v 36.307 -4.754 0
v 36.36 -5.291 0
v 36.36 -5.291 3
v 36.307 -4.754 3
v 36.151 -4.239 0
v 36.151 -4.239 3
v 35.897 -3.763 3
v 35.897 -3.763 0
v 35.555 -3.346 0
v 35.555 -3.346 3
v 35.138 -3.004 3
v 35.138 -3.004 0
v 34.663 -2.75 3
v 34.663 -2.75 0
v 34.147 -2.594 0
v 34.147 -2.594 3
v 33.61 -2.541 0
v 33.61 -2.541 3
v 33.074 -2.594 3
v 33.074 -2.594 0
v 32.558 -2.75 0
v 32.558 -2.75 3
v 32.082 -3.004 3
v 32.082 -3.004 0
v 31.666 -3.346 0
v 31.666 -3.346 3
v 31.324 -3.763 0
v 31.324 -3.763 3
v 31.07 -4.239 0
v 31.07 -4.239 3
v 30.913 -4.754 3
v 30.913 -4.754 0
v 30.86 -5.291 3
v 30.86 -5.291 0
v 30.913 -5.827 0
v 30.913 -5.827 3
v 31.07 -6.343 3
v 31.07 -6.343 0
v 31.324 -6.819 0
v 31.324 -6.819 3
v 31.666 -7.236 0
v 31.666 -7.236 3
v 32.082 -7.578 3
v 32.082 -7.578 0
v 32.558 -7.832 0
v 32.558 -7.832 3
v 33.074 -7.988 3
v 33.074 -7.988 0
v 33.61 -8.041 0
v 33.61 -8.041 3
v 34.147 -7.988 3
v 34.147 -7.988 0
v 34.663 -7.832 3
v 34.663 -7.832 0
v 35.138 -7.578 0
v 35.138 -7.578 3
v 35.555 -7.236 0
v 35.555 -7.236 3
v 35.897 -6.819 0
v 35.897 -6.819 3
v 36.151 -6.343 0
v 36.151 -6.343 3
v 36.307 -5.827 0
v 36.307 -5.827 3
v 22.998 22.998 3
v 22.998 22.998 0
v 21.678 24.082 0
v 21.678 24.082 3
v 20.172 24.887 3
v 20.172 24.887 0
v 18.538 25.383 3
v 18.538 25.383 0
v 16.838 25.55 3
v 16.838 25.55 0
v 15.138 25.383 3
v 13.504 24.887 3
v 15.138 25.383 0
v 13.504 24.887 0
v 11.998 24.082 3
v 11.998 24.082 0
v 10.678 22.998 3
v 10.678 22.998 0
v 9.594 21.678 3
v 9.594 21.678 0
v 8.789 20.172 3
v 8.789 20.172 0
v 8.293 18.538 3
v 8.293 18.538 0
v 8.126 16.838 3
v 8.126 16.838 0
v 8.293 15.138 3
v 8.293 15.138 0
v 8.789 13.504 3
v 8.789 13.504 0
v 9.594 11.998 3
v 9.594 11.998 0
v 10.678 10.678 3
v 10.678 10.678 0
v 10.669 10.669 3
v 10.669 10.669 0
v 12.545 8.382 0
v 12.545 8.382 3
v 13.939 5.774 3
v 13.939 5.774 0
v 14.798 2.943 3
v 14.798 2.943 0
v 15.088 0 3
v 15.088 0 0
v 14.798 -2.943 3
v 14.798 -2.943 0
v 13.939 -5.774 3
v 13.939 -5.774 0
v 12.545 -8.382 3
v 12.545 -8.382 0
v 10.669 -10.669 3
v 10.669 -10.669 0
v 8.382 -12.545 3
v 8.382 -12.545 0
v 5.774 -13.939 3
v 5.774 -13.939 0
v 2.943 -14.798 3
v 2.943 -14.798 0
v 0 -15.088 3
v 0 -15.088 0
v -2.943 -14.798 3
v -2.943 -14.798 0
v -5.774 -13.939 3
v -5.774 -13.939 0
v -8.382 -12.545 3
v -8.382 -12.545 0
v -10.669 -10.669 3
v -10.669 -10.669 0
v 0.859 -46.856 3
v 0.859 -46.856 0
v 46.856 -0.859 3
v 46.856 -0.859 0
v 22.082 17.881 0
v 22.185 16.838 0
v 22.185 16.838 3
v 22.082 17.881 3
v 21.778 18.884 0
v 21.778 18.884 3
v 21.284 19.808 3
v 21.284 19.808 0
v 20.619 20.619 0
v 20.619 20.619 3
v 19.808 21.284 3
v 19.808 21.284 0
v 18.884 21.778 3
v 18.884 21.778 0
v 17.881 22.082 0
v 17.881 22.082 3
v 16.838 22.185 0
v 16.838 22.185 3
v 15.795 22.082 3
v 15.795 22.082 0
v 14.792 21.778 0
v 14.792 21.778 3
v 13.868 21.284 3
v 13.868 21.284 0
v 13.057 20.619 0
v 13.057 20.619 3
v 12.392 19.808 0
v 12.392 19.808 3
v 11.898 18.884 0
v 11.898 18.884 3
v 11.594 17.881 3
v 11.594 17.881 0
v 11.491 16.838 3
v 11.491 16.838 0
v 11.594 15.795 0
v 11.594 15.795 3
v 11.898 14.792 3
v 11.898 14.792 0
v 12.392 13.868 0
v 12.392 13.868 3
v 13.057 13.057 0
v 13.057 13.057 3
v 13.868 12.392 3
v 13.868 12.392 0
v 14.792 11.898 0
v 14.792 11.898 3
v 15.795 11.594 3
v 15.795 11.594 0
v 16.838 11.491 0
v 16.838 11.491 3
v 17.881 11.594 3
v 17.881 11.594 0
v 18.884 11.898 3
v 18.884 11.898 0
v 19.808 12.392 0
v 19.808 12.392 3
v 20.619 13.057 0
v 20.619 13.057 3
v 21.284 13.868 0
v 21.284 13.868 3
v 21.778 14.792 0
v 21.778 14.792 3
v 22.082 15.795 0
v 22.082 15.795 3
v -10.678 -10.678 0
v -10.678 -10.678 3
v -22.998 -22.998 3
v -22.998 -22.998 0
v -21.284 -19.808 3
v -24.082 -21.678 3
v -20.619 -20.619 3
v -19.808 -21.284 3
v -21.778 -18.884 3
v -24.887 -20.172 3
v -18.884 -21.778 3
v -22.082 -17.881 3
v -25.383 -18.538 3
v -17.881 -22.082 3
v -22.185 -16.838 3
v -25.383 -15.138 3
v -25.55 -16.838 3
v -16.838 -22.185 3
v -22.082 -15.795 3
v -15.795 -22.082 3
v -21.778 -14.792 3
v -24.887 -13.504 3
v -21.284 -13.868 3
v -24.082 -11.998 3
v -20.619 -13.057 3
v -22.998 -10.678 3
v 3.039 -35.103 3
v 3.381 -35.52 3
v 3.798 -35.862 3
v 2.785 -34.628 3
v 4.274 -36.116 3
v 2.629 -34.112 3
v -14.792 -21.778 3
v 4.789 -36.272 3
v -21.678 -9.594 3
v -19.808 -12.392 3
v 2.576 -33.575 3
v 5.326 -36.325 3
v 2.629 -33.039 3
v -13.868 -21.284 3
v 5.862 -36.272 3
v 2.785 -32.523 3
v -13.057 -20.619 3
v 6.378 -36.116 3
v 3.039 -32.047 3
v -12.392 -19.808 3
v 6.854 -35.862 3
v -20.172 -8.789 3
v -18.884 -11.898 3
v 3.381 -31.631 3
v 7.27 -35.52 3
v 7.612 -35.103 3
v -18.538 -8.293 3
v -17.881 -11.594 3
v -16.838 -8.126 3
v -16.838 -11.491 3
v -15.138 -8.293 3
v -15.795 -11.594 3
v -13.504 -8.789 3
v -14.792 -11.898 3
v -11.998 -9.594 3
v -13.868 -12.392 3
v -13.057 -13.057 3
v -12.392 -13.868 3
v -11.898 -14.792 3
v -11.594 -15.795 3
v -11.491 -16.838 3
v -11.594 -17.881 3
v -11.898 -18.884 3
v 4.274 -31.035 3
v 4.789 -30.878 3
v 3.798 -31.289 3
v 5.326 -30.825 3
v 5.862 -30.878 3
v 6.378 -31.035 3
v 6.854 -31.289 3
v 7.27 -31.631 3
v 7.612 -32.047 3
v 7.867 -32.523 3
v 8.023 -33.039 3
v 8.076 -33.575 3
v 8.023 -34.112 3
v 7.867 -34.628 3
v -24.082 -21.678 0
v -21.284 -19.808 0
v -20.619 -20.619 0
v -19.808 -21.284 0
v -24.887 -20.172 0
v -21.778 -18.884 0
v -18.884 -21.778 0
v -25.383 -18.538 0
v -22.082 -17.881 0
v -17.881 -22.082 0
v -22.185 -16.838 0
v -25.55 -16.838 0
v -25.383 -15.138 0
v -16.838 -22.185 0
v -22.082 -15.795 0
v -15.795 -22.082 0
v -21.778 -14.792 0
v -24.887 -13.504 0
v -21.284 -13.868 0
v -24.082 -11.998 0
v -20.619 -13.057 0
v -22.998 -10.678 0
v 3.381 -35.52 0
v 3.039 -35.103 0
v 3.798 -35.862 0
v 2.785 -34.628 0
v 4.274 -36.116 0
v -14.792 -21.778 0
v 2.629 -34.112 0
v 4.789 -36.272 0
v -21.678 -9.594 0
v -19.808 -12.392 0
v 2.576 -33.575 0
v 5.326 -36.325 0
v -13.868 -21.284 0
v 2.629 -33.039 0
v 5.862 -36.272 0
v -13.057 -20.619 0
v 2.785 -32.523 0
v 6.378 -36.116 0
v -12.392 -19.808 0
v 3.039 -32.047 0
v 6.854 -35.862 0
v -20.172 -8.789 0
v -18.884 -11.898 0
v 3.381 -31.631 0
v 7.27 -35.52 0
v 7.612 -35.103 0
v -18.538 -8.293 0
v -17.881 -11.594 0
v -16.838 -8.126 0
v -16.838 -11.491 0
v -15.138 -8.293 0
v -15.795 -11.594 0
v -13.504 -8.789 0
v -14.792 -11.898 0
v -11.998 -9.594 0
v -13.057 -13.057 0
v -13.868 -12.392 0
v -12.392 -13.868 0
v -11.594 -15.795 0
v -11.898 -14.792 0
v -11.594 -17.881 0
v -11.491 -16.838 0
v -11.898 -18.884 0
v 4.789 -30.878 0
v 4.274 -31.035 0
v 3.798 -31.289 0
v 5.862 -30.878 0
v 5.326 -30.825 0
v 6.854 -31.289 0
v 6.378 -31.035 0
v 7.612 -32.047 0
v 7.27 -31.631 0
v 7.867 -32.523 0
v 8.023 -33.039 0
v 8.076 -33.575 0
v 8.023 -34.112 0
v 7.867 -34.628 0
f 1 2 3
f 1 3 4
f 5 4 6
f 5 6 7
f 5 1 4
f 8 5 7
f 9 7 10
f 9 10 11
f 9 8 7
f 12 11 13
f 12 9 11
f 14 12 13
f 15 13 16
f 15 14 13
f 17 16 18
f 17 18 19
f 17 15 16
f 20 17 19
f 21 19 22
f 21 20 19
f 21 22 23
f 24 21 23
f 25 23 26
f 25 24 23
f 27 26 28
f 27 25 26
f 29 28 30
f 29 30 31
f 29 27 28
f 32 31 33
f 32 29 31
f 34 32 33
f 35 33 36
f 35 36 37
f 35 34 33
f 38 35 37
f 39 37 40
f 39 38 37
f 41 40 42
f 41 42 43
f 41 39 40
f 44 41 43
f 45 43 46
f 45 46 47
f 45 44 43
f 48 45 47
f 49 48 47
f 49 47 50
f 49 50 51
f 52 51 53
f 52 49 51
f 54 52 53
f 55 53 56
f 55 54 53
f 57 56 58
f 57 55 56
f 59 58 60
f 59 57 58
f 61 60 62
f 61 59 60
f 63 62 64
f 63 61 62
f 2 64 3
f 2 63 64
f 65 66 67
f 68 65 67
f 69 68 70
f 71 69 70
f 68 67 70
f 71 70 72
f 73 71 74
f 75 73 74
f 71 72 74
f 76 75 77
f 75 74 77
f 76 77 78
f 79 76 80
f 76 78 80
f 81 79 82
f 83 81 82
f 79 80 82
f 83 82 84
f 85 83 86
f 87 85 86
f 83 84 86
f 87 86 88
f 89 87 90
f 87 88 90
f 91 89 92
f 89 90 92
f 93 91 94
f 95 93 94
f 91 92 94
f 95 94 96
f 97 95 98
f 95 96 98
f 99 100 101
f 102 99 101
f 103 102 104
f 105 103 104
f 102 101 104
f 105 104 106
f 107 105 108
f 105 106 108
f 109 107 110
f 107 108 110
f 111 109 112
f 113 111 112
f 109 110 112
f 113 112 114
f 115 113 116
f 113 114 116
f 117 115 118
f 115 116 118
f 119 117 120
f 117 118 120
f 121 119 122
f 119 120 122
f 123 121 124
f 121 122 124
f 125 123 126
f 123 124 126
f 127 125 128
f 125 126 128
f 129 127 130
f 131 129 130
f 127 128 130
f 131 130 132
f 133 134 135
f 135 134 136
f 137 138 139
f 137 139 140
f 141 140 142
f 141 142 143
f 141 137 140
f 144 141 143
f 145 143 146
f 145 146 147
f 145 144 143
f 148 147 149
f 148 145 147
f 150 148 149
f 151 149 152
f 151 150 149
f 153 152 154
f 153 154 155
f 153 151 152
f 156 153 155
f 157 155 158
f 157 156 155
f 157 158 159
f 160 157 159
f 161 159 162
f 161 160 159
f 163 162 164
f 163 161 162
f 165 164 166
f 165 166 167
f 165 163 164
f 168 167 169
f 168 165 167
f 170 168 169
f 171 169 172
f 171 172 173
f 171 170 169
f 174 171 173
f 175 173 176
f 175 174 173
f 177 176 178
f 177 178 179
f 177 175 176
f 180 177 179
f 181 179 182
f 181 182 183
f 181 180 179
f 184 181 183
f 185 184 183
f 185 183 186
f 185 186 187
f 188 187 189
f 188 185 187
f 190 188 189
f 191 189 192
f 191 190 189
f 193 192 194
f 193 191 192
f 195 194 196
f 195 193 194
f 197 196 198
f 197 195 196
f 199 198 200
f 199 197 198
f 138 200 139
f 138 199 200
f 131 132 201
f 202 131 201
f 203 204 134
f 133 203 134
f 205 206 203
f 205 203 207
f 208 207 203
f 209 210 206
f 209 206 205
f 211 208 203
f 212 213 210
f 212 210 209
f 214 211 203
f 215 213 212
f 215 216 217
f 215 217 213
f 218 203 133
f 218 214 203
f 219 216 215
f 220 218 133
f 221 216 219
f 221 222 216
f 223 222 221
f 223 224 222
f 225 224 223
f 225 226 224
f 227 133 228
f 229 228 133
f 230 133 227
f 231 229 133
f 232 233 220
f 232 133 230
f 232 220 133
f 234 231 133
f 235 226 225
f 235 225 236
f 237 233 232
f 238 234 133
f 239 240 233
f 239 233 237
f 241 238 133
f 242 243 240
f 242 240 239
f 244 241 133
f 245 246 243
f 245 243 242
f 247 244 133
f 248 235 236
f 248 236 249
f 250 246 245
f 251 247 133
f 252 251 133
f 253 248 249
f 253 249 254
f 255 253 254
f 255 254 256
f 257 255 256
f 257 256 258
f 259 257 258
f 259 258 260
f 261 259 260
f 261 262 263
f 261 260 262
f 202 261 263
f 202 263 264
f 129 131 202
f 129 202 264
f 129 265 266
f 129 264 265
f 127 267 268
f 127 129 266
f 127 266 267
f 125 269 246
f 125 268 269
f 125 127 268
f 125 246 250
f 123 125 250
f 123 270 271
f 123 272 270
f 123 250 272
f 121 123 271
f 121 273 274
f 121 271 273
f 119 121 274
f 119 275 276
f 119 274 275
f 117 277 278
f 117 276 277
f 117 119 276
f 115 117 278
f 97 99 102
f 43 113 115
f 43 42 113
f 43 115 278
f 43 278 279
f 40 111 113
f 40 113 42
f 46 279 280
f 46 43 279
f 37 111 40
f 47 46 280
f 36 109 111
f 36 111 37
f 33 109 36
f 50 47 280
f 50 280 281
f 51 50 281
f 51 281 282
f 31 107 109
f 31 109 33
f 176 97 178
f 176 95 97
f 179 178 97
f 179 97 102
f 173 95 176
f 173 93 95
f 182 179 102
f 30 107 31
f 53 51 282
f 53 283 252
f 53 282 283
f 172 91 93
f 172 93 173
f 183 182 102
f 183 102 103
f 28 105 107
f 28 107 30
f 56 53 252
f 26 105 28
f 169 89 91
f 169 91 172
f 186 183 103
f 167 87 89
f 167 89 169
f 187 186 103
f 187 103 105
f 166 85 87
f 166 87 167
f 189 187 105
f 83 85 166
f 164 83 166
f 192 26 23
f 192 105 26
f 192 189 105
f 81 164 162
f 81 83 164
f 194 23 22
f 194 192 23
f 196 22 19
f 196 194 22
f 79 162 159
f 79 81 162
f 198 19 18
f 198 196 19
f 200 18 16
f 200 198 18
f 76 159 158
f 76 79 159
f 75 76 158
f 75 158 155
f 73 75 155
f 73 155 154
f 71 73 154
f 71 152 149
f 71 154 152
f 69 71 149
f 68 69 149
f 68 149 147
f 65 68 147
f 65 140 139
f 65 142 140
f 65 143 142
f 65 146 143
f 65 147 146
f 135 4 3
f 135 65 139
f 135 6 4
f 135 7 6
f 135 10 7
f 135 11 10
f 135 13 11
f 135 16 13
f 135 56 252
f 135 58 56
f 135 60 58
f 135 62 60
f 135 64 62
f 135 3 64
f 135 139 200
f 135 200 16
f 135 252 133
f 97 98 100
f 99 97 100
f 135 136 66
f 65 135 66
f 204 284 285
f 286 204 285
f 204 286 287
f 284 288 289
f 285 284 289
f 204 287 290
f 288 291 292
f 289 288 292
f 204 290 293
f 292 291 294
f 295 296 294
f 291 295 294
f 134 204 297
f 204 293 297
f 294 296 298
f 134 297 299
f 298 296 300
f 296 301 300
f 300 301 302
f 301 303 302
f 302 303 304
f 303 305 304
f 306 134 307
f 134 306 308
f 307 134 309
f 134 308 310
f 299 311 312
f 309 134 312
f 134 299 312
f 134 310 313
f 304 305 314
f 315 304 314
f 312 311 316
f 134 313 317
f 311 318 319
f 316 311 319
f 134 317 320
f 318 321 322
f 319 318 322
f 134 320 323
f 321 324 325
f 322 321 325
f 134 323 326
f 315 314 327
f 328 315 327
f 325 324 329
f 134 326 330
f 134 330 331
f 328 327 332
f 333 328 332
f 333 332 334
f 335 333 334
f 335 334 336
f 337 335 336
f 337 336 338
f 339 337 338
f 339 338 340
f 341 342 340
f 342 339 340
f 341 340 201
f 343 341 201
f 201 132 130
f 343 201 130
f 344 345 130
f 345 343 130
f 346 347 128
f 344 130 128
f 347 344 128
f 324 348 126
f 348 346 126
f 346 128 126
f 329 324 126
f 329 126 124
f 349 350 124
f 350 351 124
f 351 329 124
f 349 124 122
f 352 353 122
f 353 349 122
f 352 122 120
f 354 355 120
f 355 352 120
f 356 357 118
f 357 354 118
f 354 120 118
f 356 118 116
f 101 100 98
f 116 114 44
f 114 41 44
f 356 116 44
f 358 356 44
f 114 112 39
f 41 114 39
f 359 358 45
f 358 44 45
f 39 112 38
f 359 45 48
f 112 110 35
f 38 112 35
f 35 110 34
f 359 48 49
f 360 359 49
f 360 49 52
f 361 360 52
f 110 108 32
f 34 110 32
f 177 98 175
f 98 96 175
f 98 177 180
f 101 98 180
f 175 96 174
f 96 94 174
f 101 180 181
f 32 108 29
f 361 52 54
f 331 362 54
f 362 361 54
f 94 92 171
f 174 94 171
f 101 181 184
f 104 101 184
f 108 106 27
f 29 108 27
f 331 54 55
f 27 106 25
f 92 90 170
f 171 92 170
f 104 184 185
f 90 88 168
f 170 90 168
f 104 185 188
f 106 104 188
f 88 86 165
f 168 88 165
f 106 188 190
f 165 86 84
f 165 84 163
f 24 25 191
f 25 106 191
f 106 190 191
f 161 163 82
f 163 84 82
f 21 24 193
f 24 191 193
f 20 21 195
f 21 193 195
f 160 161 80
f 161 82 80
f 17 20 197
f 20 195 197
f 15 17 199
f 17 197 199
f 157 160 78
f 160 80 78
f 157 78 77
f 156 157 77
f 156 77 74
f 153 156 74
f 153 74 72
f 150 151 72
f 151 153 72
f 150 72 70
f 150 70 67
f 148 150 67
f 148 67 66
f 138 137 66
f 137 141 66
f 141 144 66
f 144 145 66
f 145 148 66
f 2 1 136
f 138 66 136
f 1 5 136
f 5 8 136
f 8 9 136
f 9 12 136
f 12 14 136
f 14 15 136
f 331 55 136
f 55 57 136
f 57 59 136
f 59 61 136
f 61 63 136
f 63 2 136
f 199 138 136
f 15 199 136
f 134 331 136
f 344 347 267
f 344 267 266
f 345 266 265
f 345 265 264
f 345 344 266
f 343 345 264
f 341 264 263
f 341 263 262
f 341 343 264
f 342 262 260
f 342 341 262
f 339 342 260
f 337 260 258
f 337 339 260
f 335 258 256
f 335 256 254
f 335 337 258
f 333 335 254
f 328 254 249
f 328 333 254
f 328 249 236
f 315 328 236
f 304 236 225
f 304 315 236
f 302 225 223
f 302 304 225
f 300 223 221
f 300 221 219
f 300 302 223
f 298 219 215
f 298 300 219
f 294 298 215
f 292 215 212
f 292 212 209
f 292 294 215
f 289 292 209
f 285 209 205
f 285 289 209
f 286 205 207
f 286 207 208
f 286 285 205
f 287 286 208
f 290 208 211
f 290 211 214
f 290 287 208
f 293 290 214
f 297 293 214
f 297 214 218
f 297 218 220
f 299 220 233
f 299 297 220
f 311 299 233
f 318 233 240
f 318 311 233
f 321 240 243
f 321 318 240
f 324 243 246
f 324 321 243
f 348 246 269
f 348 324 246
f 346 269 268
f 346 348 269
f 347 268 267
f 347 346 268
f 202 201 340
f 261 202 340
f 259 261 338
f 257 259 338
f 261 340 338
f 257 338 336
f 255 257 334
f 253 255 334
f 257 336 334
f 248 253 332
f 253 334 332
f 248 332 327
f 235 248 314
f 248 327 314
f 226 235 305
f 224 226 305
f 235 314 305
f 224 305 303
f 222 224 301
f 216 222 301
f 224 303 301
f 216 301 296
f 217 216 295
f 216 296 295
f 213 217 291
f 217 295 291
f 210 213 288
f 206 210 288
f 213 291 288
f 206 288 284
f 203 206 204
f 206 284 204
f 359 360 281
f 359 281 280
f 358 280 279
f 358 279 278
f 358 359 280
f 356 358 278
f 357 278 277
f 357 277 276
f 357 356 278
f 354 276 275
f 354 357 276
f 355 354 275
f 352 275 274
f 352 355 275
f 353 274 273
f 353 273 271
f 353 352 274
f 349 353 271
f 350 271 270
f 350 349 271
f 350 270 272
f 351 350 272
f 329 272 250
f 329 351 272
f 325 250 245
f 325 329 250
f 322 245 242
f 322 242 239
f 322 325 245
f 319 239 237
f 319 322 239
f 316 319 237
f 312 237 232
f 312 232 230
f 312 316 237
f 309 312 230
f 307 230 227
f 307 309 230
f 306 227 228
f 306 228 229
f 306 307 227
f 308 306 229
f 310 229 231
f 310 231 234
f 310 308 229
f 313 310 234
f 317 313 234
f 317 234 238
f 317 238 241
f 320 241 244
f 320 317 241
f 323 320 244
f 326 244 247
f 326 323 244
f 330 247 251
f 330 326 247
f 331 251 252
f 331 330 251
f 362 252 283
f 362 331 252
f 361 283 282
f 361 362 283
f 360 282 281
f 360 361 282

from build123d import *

# Parameters (mm, degrees)
SKETCH8_R           = 2.75
SKETCH8_R_2         = 5.3467
BOSS_EXTRUDE1_DEPTH = 3


with BuildPart() as part:
    # Sketch8 → Boss-Extrude1 (new body)
    with BuildSketch(Plane.XY):
        with BuildLine():
            Line((-22.998435926, -22.998435926), (0.859030886, -46.855902739))
            Line((0.859030886, -46.855902739), (46.855902739, -0.859030886))
            Line((46.855902739, -0.859030886), (22.998435926, 22.998435926))
            ThreePointArc((22.998435926, 22.998435926), (10.677524528, 22.998435926), (10.677524528, 10.677524528))
            Line((10.677524528, 10.677524528), (10.668544272, 10.668544272))
            ThreePointArc((10.668544272, 10.668544272), (10.668544272, -10.668544272), (-10.668544272, -10.668544272))
            Line((-10.668544272, -10.668544272), (-10.677524528, -10.677524528))
            ThreePointArc((-10.677524528, -10.677524528), (-22.998435926, -10.677524528), (-22.998435926, -22.998435926))
        make_face()
        with Locations((33.610182952, -5.29098063)):
            Circle(SKETCH8_R, mode=Mode.SUBTRACT)
        with Locations((16.837980227, 16.837980227)):
            Circle(SKETCH8_R_2, mode=Mode.SUBTRACT)
        with Locations((-16.837980227, -16.837980227)):
            Circle(SKETCH8_R_2, mode=Mode.SUBTRACT)
        with Locations((5.325911705, -33.575251877)):
            Circle(SKETCH8_R, mode=Mode.SUBTRACT)
    extrude(amount=BOSS_EXTRUDE1_DEPTH)


solid = part.part
